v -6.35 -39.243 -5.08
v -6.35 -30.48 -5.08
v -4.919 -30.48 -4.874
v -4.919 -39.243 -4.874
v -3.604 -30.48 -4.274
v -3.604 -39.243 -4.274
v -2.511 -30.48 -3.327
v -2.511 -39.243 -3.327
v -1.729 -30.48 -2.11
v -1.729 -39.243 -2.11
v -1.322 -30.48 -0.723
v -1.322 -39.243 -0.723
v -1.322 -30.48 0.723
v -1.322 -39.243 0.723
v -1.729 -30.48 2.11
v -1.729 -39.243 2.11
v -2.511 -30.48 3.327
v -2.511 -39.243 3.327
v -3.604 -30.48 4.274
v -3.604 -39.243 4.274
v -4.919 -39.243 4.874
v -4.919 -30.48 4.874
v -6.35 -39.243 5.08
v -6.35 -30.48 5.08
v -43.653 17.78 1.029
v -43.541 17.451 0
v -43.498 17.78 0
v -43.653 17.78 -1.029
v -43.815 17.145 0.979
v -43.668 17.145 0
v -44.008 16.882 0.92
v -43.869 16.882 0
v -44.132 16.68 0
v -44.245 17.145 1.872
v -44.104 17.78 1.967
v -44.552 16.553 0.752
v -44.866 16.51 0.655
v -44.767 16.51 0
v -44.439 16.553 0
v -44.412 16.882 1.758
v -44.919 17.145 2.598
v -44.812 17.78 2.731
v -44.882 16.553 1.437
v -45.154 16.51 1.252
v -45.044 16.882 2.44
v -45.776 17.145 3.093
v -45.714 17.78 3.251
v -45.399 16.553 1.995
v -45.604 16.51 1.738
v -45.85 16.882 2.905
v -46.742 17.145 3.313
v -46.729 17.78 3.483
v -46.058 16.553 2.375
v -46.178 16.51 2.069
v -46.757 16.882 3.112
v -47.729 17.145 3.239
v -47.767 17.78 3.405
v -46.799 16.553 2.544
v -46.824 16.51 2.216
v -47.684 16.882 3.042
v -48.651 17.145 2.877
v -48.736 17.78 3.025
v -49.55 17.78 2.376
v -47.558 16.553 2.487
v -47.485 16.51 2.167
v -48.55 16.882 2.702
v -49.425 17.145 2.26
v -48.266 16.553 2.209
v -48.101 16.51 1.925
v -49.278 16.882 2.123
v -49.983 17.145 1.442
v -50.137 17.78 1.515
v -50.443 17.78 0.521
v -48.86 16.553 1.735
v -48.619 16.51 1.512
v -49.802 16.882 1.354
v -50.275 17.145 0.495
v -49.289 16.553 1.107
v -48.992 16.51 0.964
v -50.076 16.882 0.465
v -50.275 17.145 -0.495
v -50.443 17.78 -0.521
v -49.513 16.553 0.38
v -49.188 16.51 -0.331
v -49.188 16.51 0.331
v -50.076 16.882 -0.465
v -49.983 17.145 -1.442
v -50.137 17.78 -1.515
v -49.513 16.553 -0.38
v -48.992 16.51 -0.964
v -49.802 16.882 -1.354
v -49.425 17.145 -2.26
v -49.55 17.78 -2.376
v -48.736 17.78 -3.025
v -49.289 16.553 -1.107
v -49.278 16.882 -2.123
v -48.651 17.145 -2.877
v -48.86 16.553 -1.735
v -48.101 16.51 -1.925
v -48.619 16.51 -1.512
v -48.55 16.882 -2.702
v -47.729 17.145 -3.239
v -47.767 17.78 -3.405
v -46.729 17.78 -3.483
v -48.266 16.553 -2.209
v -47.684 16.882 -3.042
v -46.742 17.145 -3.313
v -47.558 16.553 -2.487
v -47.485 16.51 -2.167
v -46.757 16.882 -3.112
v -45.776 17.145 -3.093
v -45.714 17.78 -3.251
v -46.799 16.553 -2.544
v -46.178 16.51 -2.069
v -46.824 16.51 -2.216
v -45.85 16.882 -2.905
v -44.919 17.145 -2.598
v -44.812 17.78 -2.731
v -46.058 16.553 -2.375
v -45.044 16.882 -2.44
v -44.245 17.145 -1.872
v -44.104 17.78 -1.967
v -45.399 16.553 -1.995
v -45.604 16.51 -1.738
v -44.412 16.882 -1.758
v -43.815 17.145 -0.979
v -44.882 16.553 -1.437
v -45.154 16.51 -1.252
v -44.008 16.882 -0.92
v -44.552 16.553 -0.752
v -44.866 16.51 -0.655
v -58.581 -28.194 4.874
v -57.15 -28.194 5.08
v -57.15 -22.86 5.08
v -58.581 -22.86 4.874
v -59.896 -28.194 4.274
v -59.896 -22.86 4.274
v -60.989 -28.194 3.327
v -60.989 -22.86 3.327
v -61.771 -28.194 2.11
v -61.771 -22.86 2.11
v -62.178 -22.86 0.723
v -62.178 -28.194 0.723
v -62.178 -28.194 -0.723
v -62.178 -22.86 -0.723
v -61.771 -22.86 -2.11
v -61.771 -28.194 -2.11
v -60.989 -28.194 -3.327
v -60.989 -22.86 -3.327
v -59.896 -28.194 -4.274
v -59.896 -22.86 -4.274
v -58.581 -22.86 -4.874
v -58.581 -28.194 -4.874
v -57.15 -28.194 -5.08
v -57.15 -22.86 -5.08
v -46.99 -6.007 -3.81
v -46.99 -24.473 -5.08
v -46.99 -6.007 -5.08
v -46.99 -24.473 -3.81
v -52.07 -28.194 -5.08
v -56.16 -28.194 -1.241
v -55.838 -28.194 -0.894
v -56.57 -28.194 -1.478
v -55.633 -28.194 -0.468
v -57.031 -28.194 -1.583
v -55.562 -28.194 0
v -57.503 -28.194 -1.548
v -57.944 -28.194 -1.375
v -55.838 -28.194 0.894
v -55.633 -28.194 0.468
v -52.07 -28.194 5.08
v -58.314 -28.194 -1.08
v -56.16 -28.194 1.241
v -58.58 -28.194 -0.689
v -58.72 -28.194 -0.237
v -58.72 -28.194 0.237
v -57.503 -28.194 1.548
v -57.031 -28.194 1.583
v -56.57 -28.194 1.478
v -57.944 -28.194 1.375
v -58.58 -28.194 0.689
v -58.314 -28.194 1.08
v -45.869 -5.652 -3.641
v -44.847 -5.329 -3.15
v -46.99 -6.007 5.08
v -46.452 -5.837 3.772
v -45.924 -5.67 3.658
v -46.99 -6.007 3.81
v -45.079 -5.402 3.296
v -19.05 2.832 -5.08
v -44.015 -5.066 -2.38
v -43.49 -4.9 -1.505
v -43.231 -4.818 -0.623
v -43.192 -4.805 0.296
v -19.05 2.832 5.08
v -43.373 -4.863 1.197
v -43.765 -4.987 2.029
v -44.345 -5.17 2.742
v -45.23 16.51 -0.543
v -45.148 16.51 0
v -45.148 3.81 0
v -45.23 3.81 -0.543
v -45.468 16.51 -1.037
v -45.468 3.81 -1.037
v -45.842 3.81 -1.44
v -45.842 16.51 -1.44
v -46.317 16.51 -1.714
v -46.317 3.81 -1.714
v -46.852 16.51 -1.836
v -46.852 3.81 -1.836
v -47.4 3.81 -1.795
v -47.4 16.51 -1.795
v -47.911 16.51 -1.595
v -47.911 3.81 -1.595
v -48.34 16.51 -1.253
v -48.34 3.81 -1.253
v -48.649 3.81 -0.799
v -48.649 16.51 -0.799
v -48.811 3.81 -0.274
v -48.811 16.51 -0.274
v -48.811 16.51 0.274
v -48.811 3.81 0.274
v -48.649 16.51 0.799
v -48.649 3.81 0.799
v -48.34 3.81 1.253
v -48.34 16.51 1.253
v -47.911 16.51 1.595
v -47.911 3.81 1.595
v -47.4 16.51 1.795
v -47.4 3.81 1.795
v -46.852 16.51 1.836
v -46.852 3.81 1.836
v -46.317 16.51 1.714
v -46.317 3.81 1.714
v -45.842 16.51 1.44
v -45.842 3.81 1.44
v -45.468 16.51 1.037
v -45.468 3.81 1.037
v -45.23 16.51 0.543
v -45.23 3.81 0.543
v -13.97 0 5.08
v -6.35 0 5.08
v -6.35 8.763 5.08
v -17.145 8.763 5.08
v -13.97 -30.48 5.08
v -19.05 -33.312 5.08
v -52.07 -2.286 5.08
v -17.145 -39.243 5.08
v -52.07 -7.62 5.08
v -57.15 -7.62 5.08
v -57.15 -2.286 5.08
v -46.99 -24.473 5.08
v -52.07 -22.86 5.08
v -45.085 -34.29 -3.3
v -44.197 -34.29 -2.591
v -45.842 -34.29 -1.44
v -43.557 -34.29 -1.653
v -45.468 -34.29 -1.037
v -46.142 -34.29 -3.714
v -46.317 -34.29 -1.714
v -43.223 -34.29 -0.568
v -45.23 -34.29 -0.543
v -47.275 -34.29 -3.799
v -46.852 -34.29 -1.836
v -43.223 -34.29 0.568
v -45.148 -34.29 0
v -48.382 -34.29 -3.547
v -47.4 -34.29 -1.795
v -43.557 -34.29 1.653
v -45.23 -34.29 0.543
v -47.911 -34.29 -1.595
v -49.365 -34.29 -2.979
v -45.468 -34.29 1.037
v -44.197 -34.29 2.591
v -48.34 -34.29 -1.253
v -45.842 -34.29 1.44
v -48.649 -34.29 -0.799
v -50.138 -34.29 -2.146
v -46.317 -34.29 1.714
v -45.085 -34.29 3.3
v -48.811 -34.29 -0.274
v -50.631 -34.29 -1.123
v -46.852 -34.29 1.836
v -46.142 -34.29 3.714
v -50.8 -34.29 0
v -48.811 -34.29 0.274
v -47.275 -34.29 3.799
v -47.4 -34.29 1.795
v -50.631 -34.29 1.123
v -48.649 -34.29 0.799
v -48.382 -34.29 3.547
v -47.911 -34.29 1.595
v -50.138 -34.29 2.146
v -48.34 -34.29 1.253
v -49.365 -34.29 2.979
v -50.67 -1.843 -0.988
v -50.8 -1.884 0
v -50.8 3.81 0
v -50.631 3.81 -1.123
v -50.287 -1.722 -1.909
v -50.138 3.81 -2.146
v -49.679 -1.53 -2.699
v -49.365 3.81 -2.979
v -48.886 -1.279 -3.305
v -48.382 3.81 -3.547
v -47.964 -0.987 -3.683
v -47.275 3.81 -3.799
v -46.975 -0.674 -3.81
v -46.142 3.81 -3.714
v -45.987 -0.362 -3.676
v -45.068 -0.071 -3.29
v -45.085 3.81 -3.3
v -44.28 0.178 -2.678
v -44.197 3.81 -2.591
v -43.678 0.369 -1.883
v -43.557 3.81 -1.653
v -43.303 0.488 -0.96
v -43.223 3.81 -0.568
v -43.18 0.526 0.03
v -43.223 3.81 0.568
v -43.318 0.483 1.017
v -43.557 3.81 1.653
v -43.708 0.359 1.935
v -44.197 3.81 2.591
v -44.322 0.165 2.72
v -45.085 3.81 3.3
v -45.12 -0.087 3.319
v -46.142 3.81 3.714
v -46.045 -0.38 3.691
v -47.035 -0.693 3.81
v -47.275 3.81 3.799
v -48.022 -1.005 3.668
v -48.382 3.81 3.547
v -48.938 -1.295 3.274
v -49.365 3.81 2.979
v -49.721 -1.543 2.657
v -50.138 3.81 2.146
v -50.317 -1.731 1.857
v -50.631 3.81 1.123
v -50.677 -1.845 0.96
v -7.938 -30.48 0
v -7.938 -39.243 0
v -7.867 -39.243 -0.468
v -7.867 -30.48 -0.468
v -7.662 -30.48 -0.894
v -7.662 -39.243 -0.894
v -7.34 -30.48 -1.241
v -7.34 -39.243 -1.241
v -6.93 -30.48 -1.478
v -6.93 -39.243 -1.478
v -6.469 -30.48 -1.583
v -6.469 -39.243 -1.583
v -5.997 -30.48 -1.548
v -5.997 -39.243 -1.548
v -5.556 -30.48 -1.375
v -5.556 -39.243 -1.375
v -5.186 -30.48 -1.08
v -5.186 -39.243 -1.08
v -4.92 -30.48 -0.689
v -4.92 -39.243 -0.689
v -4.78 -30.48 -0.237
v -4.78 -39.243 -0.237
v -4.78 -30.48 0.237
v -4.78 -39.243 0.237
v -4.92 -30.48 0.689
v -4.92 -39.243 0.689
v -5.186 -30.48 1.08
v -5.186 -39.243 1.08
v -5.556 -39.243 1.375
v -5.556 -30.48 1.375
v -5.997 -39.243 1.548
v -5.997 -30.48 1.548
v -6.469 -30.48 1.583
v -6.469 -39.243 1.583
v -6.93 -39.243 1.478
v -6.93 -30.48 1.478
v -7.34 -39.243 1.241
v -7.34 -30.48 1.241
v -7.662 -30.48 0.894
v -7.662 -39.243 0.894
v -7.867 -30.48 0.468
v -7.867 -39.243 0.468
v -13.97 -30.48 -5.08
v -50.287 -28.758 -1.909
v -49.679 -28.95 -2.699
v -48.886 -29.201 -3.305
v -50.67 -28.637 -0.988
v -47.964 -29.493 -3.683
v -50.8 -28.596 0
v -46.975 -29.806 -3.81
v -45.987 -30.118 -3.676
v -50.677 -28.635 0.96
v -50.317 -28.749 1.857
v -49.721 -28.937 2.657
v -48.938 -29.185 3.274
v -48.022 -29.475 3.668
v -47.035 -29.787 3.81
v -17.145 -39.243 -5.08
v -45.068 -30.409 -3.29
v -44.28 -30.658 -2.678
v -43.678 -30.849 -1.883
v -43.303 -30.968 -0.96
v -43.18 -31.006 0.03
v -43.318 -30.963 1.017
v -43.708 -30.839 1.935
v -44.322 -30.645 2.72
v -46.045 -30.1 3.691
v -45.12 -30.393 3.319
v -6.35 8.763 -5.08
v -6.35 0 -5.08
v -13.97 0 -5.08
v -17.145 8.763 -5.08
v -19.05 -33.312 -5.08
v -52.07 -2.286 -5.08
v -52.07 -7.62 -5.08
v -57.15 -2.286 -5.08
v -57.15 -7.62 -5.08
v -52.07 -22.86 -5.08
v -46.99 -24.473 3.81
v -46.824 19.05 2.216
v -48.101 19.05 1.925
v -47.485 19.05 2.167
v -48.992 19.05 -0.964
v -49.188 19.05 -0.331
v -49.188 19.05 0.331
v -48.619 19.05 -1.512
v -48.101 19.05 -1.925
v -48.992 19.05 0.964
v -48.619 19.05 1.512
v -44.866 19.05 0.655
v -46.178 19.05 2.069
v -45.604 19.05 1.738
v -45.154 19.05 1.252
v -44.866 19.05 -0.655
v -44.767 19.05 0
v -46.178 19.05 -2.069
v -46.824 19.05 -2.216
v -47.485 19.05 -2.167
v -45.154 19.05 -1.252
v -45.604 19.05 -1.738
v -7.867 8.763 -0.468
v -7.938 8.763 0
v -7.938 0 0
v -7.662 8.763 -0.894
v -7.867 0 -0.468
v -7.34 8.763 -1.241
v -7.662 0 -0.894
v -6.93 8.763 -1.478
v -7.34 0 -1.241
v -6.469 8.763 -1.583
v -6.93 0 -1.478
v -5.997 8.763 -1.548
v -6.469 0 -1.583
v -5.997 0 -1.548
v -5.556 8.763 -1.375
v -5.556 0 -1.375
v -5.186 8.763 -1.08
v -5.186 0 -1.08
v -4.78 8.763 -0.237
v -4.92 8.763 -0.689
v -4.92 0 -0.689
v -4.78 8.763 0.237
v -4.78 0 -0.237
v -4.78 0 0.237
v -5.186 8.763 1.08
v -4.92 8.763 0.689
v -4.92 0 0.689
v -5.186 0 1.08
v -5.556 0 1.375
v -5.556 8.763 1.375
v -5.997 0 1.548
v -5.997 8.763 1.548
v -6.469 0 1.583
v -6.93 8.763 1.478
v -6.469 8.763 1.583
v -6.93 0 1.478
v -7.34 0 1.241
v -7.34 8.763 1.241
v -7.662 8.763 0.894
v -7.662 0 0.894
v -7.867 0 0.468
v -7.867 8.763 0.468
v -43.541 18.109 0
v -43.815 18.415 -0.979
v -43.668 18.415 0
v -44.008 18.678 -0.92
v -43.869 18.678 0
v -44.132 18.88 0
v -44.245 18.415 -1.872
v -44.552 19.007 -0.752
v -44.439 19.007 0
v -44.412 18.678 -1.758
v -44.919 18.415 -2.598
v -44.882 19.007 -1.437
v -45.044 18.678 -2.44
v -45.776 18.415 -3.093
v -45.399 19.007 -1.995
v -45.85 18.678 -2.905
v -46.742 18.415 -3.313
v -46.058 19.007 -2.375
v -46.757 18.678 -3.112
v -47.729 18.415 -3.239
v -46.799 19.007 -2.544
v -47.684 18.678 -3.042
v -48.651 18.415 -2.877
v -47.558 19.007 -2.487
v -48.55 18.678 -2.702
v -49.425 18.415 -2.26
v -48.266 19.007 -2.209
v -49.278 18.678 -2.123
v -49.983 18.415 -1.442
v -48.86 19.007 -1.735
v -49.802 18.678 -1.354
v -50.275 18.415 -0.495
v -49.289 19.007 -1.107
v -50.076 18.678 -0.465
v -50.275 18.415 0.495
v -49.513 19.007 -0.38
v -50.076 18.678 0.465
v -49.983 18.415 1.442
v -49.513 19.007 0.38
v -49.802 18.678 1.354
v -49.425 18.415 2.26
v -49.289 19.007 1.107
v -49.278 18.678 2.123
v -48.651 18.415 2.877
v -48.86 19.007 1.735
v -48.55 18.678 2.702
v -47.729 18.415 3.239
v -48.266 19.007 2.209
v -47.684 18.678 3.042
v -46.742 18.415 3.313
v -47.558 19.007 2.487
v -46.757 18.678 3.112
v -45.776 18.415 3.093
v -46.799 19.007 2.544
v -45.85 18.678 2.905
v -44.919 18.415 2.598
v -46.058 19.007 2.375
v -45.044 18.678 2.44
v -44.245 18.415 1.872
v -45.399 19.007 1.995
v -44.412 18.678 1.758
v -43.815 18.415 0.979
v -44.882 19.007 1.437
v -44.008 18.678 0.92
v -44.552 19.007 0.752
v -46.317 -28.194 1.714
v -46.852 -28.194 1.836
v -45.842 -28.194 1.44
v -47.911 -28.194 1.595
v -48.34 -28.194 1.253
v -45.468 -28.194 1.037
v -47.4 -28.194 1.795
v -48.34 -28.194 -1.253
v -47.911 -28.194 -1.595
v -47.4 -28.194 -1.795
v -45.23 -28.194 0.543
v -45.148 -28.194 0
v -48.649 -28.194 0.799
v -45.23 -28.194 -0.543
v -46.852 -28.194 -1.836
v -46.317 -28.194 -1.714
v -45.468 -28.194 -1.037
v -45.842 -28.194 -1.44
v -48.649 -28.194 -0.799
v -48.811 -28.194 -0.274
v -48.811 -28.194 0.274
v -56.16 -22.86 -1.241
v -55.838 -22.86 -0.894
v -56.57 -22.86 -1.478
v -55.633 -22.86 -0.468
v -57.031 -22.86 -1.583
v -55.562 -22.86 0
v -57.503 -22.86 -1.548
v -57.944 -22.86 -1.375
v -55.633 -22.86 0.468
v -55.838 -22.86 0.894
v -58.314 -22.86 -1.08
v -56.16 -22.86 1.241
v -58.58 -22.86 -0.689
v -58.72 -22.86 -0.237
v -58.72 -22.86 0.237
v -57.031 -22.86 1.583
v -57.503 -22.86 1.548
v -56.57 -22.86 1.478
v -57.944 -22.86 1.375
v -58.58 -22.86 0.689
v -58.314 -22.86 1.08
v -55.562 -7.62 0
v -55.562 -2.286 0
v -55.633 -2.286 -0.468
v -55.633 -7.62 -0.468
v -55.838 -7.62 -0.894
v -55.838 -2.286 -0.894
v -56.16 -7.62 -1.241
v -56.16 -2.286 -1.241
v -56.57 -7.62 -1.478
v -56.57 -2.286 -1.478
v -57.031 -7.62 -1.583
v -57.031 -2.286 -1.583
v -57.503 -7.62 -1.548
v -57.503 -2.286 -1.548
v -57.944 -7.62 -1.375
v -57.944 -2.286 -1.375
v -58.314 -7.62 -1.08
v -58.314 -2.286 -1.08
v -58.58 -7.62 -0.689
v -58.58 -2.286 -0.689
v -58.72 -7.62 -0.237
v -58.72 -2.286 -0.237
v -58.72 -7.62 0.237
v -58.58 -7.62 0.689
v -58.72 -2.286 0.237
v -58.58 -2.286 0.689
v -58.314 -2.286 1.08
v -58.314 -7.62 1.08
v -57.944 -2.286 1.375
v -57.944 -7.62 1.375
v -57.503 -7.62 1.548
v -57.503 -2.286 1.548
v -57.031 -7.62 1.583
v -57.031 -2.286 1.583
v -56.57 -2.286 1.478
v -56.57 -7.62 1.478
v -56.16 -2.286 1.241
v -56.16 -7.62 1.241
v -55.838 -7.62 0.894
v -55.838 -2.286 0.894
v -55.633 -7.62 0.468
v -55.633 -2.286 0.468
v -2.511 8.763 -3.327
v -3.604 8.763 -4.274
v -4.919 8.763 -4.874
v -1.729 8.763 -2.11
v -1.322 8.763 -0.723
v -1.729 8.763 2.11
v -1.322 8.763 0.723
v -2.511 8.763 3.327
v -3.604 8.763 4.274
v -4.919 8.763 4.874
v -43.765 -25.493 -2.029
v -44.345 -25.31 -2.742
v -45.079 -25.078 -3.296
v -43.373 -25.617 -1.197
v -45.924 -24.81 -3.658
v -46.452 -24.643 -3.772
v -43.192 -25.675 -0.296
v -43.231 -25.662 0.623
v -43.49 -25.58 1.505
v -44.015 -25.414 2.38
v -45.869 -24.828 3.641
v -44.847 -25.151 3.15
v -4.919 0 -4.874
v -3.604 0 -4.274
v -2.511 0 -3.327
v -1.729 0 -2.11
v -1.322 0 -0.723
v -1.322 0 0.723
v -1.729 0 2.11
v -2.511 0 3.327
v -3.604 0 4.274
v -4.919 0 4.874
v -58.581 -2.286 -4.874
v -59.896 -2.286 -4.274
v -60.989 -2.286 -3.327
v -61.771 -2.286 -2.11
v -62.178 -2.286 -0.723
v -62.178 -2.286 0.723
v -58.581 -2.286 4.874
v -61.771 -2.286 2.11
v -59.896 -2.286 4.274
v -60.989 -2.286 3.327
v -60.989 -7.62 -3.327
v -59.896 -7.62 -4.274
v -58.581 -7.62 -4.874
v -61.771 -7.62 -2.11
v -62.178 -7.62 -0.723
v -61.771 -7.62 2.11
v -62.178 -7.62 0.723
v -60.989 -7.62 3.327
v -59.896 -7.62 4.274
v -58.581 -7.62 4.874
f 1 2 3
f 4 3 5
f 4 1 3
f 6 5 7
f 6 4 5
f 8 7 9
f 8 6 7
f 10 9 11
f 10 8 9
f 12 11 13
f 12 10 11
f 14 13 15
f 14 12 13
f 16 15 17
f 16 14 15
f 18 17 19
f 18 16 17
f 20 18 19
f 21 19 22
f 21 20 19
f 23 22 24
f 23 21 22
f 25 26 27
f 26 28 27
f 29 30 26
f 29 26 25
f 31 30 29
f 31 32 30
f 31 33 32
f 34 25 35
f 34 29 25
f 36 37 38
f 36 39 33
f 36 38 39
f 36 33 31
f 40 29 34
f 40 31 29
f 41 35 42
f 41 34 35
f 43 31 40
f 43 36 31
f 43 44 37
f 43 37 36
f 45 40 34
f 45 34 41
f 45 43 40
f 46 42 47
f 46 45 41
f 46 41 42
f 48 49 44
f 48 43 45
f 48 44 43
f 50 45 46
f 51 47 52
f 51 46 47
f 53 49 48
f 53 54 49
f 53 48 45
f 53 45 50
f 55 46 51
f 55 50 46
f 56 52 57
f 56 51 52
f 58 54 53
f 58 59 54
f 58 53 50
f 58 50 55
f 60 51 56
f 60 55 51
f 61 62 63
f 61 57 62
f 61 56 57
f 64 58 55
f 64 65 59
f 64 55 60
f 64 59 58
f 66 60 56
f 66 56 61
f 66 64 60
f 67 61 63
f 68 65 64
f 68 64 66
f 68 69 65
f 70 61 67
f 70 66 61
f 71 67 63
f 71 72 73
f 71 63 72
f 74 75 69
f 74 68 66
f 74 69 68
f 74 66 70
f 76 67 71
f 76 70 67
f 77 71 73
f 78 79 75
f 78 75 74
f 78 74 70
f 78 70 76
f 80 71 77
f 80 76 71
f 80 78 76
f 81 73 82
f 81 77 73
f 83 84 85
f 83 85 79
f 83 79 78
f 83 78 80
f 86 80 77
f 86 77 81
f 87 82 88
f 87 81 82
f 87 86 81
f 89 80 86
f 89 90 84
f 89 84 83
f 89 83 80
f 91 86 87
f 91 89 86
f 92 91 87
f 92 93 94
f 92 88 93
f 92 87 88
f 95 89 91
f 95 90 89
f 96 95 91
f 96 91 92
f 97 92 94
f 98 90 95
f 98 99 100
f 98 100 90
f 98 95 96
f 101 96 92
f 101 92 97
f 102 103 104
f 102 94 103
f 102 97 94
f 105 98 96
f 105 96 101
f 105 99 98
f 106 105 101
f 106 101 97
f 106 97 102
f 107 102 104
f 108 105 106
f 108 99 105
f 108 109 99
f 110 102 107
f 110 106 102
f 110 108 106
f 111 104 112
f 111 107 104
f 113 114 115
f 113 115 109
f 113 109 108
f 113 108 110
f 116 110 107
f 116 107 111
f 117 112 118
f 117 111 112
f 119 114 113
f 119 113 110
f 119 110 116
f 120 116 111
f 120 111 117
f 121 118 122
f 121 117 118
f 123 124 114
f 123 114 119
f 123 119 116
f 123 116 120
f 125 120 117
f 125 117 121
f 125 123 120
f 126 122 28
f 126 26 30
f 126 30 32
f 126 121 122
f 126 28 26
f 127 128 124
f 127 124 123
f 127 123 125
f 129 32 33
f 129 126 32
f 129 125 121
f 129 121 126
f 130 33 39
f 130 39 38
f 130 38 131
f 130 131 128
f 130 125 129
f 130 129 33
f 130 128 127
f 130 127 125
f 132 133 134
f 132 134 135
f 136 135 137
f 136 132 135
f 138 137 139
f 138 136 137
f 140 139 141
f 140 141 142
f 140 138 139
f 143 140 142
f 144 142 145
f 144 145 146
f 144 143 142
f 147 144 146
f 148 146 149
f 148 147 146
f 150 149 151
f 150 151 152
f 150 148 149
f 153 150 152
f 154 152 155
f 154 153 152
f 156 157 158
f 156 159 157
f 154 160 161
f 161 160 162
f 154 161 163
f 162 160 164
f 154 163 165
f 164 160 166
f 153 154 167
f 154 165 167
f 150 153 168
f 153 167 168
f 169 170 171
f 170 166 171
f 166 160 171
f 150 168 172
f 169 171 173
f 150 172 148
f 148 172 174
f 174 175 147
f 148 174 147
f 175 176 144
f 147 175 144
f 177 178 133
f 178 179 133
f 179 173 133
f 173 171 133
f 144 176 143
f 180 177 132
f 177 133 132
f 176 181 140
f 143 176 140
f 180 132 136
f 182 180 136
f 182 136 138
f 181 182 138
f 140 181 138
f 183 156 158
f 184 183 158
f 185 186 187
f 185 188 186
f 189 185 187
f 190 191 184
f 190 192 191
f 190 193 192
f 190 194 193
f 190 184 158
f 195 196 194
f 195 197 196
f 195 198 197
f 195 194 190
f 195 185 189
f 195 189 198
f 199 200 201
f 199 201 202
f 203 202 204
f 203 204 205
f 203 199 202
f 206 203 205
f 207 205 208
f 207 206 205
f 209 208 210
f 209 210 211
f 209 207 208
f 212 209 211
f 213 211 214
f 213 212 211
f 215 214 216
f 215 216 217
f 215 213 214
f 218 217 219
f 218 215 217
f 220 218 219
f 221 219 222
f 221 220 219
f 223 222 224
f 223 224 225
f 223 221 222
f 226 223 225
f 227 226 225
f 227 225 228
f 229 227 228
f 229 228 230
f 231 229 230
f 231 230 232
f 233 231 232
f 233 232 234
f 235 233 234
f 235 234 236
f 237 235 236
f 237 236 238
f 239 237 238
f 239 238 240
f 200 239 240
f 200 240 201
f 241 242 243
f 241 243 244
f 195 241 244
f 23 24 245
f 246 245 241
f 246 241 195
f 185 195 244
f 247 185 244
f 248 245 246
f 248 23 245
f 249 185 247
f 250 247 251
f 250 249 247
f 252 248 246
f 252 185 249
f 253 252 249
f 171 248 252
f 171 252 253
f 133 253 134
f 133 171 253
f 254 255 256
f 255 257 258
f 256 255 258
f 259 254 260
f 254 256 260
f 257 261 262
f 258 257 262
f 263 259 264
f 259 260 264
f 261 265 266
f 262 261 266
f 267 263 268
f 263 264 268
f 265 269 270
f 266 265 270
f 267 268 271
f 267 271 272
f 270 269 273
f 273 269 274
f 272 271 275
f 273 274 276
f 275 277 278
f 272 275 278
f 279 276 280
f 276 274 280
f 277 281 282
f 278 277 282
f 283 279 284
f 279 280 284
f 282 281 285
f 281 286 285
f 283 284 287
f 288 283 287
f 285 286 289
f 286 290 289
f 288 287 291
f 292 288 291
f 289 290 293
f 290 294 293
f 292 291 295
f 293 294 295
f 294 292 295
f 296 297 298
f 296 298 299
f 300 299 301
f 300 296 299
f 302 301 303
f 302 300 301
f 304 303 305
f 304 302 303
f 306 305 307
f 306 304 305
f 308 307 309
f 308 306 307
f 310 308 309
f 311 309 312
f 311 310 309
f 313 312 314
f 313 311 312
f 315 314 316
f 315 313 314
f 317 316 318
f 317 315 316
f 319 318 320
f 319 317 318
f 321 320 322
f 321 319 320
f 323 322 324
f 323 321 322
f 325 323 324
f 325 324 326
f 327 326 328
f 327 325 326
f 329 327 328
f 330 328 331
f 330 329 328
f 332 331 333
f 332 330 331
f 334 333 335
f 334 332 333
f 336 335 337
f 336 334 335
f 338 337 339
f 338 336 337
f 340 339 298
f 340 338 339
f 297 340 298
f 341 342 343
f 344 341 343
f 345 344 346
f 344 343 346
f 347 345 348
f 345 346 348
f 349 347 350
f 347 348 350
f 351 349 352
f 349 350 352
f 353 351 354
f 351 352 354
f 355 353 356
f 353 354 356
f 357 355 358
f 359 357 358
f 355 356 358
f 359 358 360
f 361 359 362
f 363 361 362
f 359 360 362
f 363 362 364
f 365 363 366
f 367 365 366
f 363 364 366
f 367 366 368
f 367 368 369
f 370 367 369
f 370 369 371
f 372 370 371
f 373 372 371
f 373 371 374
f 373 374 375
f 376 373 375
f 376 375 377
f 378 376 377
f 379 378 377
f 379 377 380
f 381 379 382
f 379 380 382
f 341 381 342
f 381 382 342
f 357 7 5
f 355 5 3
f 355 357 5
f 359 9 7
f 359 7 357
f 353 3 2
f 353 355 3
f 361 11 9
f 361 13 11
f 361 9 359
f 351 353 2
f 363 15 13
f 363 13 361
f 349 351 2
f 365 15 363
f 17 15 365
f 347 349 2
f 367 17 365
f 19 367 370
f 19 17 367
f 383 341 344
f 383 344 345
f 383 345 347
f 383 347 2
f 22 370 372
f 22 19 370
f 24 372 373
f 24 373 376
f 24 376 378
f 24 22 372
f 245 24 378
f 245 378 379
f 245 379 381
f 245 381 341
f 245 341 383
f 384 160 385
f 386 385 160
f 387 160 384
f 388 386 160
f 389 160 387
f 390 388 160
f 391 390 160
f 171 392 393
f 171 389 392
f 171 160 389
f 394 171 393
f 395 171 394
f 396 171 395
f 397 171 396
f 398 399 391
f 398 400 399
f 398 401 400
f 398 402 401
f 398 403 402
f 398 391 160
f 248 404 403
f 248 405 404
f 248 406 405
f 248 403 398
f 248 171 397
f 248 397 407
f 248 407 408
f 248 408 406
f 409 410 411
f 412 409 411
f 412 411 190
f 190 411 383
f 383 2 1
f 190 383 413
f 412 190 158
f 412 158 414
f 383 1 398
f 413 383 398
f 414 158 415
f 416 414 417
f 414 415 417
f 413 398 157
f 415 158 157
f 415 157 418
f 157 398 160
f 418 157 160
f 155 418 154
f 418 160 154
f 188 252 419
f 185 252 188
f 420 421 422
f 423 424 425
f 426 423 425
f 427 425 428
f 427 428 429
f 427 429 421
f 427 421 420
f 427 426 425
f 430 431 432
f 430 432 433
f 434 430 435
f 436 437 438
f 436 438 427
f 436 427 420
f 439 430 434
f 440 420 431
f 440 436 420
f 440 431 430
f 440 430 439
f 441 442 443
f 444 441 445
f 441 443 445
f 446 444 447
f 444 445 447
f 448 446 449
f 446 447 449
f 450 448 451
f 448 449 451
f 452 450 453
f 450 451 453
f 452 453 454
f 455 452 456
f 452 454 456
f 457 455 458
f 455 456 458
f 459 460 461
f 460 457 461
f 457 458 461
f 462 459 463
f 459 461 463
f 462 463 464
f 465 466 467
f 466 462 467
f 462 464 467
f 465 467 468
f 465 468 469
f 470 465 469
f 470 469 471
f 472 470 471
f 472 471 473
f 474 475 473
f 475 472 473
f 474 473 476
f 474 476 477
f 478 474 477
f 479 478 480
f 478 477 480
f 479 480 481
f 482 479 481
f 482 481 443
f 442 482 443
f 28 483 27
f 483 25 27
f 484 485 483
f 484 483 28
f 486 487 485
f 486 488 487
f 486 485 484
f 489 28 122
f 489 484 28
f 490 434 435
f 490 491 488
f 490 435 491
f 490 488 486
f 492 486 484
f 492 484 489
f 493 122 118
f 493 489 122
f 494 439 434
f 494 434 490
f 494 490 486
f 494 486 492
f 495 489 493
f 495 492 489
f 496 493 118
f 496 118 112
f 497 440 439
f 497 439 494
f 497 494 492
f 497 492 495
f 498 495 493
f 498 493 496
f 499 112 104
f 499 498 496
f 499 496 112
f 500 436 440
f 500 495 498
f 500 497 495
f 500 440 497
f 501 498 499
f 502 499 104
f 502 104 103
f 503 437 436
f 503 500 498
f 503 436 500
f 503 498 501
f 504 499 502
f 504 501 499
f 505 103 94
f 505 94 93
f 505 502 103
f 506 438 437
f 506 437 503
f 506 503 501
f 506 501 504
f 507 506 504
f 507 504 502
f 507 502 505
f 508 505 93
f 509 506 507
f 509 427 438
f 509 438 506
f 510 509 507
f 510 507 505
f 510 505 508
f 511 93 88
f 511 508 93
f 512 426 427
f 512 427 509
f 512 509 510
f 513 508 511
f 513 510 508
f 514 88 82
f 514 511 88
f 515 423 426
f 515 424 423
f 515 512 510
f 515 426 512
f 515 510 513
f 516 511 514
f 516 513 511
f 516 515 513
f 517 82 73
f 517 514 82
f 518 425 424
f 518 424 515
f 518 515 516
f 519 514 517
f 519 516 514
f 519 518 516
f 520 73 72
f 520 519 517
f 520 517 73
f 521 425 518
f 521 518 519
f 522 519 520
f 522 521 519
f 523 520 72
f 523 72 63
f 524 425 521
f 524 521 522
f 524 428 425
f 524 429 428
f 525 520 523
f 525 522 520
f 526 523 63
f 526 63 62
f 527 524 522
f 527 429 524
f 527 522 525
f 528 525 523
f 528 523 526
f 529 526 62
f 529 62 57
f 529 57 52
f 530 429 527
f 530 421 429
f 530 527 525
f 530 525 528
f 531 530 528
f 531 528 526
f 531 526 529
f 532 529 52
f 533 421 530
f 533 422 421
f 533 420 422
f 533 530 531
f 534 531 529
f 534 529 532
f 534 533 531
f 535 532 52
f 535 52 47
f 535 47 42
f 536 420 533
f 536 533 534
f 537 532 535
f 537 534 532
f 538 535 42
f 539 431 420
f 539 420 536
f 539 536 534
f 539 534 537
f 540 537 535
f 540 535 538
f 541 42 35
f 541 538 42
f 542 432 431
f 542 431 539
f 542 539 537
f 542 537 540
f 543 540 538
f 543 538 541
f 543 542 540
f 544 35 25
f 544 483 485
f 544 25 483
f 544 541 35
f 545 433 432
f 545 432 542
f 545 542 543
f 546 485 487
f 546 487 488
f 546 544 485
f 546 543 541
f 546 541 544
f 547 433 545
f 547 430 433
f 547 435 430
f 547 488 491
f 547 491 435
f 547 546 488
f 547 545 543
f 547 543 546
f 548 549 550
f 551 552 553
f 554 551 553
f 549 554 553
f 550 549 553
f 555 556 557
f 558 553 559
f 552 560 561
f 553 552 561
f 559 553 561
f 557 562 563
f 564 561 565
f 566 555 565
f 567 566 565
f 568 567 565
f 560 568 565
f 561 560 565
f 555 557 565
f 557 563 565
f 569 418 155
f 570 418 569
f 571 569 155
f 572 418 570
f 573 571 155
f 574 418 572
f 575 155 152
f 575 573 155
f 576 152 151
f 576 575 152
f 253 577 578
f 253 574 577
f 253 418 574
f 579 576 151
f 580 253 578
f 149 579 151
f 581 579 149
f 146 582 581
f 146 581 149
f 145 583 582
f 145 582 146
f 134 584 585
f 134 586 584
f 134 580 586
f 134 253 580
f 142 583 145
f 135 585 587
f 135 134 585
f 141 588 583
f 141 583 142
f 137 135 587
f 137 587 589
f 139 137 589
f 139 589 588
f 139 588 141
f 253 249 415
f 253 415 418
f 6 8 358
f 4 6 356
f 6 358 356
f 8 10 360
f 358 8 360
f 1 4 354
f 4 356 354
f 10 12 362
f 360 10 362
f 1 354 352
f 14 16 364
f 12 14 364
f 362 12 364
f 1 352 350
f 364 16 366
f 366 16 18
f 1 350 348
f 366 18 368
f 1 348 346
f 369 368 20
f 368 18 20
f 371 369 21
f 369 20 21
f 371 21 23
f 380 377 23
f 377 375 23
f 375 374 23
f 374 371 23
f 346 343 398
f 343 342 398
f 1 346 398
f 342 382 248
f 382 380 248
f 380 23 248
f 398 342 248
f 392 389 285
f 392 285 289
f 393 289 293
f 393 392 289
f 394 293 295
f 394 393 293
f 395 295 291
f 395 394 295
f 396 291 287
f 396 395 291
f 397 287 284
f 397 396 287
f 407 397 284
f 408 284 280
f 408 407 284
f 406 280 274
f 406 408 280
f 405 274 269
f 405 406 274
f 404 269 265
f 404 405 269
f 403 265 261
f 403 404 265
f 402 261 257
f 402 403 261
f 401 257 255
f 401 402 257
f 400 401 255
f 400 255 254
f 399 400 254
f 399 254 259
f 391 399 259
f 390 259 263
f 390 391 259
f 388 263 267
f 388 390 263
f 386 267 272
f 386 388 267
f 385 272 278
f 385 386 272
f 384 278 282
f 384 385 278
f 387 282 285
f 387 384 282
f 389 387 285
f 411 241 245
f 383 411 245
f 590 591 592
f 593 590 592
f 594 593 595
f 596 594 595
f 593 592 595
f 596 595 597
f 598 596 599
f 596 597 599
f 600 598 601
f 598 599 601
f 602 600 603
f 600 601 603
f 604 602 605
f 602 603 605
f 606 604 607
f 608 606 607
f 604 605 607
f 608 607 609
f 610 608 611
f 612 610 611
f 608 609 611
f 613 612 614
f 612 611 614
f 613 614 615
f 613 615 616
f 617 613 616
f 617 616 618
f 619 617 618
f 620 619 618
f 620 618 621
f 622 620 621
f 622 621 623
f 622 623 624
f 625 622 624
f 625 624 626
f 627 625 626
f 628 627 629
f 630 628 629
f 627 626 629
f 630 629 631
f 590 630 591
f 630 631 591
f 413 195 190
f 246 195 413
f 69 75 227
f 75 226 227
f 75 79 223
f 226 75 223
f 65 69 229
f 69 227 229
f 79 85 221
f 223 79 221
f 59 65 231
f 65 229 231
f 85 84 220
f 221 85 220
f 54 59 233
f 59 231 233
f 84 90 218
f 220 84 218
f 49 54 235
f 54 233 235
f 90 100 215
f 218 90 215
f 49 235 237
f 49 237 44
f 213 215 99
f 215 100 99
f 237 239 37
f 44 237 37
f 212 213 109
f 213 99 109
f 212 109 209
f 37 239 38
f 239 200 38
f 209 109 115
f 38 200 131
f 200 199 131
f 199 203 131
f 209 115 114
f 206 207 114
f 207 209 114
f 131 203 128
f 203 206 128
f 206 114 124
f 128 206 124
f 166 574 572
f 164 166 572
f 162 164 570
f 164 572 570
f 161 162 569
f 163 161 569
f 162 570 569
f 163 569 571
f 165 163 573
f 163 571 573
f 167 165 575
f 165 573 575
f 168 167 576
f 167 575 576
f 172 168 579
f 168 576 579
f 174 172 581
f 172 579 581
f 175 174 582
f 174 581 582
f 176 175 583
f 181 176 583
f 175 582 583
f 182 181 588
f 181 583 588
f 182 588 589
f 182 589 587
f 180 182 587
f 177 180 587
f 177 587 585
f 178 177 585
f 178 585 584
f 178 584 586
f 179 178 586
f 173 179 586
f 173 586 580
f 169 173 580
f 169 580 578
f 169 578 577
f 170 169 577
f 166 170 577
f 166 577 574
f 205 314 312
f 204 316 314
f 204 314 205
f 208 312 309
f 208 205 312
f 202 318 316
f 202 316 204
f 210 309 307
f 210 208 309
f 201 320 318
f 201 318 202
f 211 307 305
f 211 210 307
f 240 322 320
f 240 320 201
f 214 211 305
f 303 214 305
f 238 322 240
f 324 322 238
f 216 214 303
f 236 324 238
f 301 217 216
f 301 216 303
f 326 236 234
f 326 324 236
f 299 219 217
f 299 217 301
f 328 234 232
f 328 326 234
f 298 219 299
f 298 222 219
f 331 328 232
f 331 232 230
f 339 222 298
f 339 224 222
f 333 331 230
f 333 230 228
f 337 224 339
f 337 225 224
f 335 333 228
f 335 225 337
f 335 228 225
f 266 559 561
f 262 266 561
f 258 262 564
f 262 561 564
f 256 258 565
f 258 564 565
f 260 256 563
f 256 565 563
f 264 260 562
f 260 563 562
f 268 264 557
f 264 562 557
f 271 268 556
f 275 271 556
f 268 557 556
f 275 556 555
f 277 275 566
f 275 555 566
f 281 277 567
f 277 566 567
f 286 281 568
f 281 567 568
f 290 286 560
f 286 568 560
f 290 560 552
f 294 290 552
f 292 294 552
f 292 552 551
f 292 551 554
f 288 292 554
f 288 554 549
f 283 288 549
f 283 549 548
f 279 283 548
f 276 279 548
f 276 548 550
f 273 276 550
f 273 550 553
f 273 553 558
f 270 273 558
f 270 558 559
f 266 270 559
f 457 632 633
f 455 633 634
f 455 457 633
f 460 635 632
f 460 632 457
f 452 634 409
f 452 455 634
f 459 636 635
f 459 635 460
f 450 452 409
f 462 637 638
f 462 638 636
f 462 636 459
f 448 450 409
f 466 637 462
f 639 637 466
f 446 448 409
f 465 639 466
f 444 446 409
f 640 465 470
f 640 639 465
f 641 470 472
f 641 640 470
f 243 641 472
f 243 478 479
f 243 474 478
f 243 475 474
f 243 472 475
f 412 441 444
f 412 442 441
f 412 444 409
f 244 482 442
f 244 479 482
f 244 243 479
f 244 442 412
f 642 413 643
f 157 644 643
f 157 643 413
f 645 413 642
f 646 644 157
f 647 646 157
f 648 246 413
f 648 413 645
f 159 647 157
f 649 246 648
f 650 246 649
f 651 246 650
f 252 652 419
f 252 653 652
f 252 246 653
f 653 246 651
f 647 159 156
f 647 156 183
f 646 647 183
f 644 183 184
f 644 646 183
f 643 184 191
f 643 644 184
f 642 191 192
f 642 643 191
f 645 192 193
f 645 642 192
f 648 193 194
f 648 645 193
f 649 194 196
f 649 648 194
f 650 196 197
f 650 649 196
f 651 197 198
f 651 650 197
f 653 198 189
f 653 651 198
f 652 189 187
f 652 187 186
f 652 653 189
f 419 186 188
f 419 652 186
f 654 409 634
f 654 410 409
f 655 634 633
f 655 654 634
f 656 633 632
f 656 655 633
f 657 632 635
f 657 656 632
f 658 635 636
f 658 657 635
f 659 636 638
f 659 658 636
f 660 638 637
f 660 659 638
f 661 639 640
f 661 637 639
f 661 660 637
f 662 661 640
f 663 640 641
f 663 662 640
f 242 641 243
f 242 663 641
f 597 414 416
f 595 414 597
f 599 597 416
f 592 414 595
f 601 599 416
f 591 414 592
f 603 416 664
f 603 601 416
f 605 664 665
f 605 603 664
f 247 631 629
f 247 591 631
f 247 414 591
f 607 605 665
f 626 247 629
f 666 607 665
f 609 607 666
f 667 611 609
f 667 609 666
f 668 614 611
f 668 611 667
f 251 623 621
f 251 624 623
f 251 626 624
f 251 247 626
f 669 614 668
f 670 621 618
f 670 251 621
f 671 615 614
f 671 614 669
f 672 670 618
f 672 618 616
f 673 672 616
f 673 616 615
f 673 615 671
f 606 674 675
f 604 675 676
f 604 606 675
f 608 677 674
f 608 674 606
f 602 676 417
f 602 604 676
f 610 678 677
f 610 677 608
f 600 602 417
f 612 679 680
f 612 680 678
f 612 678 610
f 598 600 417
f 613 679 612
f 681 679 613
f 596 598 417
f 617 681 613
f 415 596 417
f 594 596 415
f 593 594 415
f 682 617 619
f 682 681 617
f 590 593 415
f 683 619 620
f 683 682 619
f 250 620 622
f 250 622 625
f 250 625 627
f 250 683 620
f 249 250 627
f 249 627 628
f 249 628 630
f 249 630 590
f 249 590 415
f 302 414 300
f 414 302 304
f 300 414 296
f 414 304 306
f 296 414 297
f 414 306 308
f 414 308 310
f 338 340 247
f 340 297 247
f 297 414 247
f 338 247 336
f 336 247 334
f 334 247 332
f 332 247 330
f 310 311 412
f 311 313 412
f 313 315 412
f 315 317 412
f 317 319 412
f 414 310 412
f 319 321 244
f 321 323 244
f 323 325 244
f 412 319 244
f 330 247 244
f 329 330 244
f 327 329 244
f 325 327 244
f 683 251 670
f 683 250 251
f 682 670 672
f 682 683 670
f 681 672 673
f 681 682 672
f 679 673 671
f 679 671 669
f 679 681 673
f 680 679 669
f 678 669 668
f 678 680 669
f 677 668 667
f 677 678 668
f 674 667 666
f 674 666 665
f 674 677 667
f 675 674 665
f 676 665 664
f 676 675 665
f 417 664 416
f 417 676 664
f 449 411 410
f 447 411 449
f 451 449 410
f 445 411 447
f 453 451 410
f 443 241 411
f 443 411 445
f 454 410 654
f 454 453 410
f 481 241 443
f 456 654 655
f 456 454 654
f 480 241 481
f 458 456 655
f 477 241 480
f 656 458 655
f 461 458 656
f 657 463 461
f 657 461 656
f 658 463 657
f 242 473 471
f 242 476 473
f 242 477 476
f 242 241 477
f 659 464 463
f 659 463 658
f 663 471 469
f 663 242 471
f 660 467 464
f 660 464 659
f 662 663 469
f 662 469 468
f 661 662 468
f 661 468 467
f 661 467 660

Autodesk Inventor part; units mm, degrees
ref_plane "YZ Plane" through (0, 0, 0) normal (1, 0, 0) x (0, 1, 0)
ref_plane "XZ Plane" through (0, 0, 0) normal (0, 1, 0) x (-1, 0, 0)
ref_plane "XY Plane" through (0, 0, 0) normal (0, 0, 1) x (1, 0, 0)
ref_plane "Work Plane1" through (0, -15.24, 5.08) normal (0, 1, 0) x (-1, 0, 0)
sketch "Sketch2" plane through (0, -15.24, 0) normal (0, 1, 0) x (-1, 0, 0)
  arc A0 (6.35, -5.08) -> (6.35, 5.08) centre (6.35, 0) ccw construction
  line L0 (6.35, 5.08) -> (0, 5.08) projected
  line L1 (0, -5.08) -> (6.35, -5.08) projected
  circle A1 centre (6.35, 0) radius 1.5875 projected
  arc A2 (6.35, 5.08) -> (6.35, -5.08) centre (6.35, 0) ccw
  line L2 (6.35, 5.08) -> (57.15, 5.08)
  line L3 (6.35, -5.08) -> (57.15, -5.08)
  arc A3 (57.15, -5.08) -> (57.15, 5.08) centre (57.15, 0) ccw
  arc A4 (6.35, -5.08) -> (6.35, 5.08) centre (6.35, 0) ccw construction
  arc A5 (57.15, 5.08) -> (57.15, -5.08) centre (57.15, 0) ccw construction
  point P0 (0, 0)
  dimension "d0" = 50.8
extrude "Extrusion1" add sketch "Sketch2" along normal mid plane 48.006
sketch "Sketch3" plane through (-57.15, 8.763, 5.08) normal (0, 0, 1) x (1, 0, 0)
  line L0 (57.15, -8.763) -> (57.15, -39.243) projected
  line L1 (50.8, -8.763) -> (57.15, -8.763) projected
  line L2 (50.8, -8.763) -> (50.8, -39.243) projected
  line L3 (57.15, -39.243) -> (50.8, -39.243) projected
  line L4 (55.88, -48.006) -> (55.88, 0) projected
  line L5 (55.88, -39.243) -> (55.88, -8.763)
  line L6 (55.88, -8.763) -> (43.18, -8.763)
  line L7 (43.18, -8.763) -> (43.18, -39.243)
  line L8 (5.08, -11.049) -> (40.005, 0)
  line L9 (50.8, 0) -> (0, 0) projected
  line L10 (0, -48.006) -> (0, 0) construction
  line L11 (0, 0) -> (0, 0) projected
  line L12 (0, -48.006) -> (0, 0) construction
  line L13 (0, -48.006) -> (0, -48.006) projected
  line L14 (40.005, 0) -> (55.88, 0) construction
  line L15 (55.88, -24.003) -> (-5.08, -24.003) construction
  line L16 (40.005, 0) -> (-5.08, 0)
  line L17 (-5.08, -11.049) -> (-5.08, 0)
  line L18 (5.08, -36.957) -> (40.005, -48.006)
  line L19 (5.08, -36.957) -> (-5.08, -36.957)
  line L20 (40.005, -48.006) -> (55.88, -48.006) construction
  line L21 (50.8, -48.006) -> (0, -48.006) projected
  line L22 (-5.08, -48.006) -> (0, -48.006) projected
  line L23 (-5.08, -48.006) -> (-5.08, 0) construction
  line L24 (40.005, -48.006) -> (-5.08, -48.006)
  line L25 (-5.08, -36.957) -> (-5.08, -48.006)
  line L26 (0, -48.006) -> (0, 0) construction
  line L27 (5.08, -11.049) -> (-5.08, -11.049)
  line L28 (5.08, -36.957) -> (5.08, -11.049) construction
  line L29 (55.88, -39.243) -> (43.18, -39.243)
  dimension "d3" = 15.875
  dimension "d5" = 25.908
  dimension "d10" = 10.16
  dimension "d17" = 12.7
extrude "Extrusion2" cut sketch "Sketch3" against normal through all
sketch "Sketch4" plane through (-57.15, -2.286, 0) normal (0, 1, 0) x (1, 0, 0)
  arc A0 (0, 5.08) -> (0, -5.08) centre (0, 0) ccw projected
  circle A1 centre (0, 0) radius 1.5875
  circle A2 centre (50.8, 0) radius 1.5875 projected
  point P0 (57.15, 0)
extrude "Extrusion3" cut sketch "Sketch4" against normal through all contours A1
sketch "Sketch6" plane through (-17.145, -39.243, 5.08) normal (0, 0, 1) x (1, 0, 0)
  line L0 (-45.085, 11.049) -> (-45.085, 36.957) projected
  line L1 (-40.005, 11.049) -> (-45.085, 11.049) projected
  line L2 (-40.005, 11.049) -> (-34.925, 11.049) projected
  line L3 (-45.085, 36.957) -> (-40.005, 36.957) projected
  line L4 (-34.925, 36.957) -> (-40.005, 36.957) projected
  line L5 (-45.085, 31.623) -> (-34.925, 31.623)
  line L6 (-34.925, 31.623) -> (-34.925, 16.383)
  line L7 (-34.925, 16.383) -> (-45.085, 16.383)
  line L8 (-45.085, 16.383) -> (-45.085, 31.623)
  line L9 (-45.085, 31.623) -> (-34.925, 16.383) construction
  line L10 (-34.925, 31.623) -> (-45.085, 16.383) construction
  line L11 (-40.005, 24.003) -> (-45.085, 24.003) construction
  point P0 (17.145, 39.243)
  dimension "d19" = 10.16
  dimension "d20" = 15.24
extrude "Extrusion5" cut sketch "Sketch6" against normal through all
sketch "Sketch5" plane through (-17.145, -39.243, 5.08) normal (0, 0, 1) x (1, 0, 0)
  line L0 (-40.005, 11.049) -> (-34.925, 11.049) projected
  line L1 (-34.925, 11.049) -> (0, 0) projected
  line L2 (10.795, 0) -> (0, 0) projected
  line L3 (10.795, 0) -> (10.795, 8.763) projected
  line L4 (10.795, 39.243) -> (10.795, 48.006) projected
  line L5 (0, 48.006) -> (10.795, 48.006) projected
  line L6 (0, 48.006) -> (-34.925, 36.957) projected
  line L7 (-34.925, 36.957) -> (-40.005, 36.957) projected
  line L8 (-40.005, 11.049) -> (-40.005, 16.383) projected
  line L9 (10.795, 8.763) -> (3.175, 8.763) projected
  line L10 (3.175, 8.763) -> (3.175, 39.243) projected
  line L11 (3.175, 39.243) -> (10.795, 39.243) projected
  line L12 (-40.005, 31.623) -> (-34.925, 31.623) projected
  line L13 (-34.925, 31.623) -> (-34.925, 16.383) projected
  line L14 (-34.925, 16.383) -> (-40.005, 16.383) projected
  line L15 (-40.005, 31.623) -> (-40.005, 36.957) projected
  line L16 (-1.905, 5.9308) -> (-29.845, 14.77)
  line L17 (-29.845, 14.77) -> (-29.845, 33.236)
  line L18 (-29.845, 33.236) -> (-1.905, 42.0752)
  line L19 (-1.905, 42.0752) -> (-1.905, 5.9308)
  dimension "d23" = 5.08
extrude "Extrusion4" cut sketch "Sketch5" against normal through all contours L16 L17 L18 L19
sketch "Sketch8" plane through (0, -15.24, 5.08) normal (0, 1, 0) x (-1, 0, 0)
  circle A0 centre (46.99, -5.08) radius 3.81
  arc A1 (57.15, -10.16) -> (57.15, 0) centre (57.15, -5.08) ccw projected
  line L0 (62.23, -5.08) -> (46.99, -5.08) construction
  point P0 (0, -5.08)
  dimension "d24" = 7.62
  dimension "d25" = 15.24
extrude "Extrusion6" add sketch "Sketch8" along normal mid plane 38.1
sketch "Sketch9" plane through (-46.99, 3.81, 0) normal (0, 1, 0) x (1, 0, 0)
  circle A0 centre (0, 0) radius 1.8415
  circle A1 centre (0, 0) radius 3.81 projected
  point P0 (46.99, 0)
  dimension "d28" = 3.683
extrude "Extrusion7" cut sketch "Sketch9" against normal through all contours A0
ref_plane "Work Plane2" through (-46.99, 16.51, 0) normal (0, 1, 0) x (1, 0, 0)
sketch "Sketch10" plane through (-46.99, 16.51, 0) normal (0, 1, 0) x (1, 0, 0)
  circle A0 centre (0, 0) radius 1.8415 projected
  circle A1 centre (0, 0) radius 1.8415
  point P0 (46.99, 0)
extrude "Extrusion8" add sketch "Sketch10" against normal up to surface (44.704 mm away)
sketch "Sketch11" plane through (-46.99, 16.51, 0) normal (0, 1, 0) x (1, 0, 0)
  circle A0 centre (0, 0) radius 3.81 projected
  circle A1 centre (0, 0) radius 3.4925
  point P0 (46.99, 0)
  dimension "d34" = 6.985
extrude "Extrusion9" add sketch "Sketch11" along normal blind 2.54 contours A1
full round fillet "Fillet1" first side at (-44.0995, 16.51, 0.4255) centre faces at (-43.5088, 18.2033, 0.281) second side at (-46.6012, 19.05, -0.8909)
properties part number "A_Arm"
